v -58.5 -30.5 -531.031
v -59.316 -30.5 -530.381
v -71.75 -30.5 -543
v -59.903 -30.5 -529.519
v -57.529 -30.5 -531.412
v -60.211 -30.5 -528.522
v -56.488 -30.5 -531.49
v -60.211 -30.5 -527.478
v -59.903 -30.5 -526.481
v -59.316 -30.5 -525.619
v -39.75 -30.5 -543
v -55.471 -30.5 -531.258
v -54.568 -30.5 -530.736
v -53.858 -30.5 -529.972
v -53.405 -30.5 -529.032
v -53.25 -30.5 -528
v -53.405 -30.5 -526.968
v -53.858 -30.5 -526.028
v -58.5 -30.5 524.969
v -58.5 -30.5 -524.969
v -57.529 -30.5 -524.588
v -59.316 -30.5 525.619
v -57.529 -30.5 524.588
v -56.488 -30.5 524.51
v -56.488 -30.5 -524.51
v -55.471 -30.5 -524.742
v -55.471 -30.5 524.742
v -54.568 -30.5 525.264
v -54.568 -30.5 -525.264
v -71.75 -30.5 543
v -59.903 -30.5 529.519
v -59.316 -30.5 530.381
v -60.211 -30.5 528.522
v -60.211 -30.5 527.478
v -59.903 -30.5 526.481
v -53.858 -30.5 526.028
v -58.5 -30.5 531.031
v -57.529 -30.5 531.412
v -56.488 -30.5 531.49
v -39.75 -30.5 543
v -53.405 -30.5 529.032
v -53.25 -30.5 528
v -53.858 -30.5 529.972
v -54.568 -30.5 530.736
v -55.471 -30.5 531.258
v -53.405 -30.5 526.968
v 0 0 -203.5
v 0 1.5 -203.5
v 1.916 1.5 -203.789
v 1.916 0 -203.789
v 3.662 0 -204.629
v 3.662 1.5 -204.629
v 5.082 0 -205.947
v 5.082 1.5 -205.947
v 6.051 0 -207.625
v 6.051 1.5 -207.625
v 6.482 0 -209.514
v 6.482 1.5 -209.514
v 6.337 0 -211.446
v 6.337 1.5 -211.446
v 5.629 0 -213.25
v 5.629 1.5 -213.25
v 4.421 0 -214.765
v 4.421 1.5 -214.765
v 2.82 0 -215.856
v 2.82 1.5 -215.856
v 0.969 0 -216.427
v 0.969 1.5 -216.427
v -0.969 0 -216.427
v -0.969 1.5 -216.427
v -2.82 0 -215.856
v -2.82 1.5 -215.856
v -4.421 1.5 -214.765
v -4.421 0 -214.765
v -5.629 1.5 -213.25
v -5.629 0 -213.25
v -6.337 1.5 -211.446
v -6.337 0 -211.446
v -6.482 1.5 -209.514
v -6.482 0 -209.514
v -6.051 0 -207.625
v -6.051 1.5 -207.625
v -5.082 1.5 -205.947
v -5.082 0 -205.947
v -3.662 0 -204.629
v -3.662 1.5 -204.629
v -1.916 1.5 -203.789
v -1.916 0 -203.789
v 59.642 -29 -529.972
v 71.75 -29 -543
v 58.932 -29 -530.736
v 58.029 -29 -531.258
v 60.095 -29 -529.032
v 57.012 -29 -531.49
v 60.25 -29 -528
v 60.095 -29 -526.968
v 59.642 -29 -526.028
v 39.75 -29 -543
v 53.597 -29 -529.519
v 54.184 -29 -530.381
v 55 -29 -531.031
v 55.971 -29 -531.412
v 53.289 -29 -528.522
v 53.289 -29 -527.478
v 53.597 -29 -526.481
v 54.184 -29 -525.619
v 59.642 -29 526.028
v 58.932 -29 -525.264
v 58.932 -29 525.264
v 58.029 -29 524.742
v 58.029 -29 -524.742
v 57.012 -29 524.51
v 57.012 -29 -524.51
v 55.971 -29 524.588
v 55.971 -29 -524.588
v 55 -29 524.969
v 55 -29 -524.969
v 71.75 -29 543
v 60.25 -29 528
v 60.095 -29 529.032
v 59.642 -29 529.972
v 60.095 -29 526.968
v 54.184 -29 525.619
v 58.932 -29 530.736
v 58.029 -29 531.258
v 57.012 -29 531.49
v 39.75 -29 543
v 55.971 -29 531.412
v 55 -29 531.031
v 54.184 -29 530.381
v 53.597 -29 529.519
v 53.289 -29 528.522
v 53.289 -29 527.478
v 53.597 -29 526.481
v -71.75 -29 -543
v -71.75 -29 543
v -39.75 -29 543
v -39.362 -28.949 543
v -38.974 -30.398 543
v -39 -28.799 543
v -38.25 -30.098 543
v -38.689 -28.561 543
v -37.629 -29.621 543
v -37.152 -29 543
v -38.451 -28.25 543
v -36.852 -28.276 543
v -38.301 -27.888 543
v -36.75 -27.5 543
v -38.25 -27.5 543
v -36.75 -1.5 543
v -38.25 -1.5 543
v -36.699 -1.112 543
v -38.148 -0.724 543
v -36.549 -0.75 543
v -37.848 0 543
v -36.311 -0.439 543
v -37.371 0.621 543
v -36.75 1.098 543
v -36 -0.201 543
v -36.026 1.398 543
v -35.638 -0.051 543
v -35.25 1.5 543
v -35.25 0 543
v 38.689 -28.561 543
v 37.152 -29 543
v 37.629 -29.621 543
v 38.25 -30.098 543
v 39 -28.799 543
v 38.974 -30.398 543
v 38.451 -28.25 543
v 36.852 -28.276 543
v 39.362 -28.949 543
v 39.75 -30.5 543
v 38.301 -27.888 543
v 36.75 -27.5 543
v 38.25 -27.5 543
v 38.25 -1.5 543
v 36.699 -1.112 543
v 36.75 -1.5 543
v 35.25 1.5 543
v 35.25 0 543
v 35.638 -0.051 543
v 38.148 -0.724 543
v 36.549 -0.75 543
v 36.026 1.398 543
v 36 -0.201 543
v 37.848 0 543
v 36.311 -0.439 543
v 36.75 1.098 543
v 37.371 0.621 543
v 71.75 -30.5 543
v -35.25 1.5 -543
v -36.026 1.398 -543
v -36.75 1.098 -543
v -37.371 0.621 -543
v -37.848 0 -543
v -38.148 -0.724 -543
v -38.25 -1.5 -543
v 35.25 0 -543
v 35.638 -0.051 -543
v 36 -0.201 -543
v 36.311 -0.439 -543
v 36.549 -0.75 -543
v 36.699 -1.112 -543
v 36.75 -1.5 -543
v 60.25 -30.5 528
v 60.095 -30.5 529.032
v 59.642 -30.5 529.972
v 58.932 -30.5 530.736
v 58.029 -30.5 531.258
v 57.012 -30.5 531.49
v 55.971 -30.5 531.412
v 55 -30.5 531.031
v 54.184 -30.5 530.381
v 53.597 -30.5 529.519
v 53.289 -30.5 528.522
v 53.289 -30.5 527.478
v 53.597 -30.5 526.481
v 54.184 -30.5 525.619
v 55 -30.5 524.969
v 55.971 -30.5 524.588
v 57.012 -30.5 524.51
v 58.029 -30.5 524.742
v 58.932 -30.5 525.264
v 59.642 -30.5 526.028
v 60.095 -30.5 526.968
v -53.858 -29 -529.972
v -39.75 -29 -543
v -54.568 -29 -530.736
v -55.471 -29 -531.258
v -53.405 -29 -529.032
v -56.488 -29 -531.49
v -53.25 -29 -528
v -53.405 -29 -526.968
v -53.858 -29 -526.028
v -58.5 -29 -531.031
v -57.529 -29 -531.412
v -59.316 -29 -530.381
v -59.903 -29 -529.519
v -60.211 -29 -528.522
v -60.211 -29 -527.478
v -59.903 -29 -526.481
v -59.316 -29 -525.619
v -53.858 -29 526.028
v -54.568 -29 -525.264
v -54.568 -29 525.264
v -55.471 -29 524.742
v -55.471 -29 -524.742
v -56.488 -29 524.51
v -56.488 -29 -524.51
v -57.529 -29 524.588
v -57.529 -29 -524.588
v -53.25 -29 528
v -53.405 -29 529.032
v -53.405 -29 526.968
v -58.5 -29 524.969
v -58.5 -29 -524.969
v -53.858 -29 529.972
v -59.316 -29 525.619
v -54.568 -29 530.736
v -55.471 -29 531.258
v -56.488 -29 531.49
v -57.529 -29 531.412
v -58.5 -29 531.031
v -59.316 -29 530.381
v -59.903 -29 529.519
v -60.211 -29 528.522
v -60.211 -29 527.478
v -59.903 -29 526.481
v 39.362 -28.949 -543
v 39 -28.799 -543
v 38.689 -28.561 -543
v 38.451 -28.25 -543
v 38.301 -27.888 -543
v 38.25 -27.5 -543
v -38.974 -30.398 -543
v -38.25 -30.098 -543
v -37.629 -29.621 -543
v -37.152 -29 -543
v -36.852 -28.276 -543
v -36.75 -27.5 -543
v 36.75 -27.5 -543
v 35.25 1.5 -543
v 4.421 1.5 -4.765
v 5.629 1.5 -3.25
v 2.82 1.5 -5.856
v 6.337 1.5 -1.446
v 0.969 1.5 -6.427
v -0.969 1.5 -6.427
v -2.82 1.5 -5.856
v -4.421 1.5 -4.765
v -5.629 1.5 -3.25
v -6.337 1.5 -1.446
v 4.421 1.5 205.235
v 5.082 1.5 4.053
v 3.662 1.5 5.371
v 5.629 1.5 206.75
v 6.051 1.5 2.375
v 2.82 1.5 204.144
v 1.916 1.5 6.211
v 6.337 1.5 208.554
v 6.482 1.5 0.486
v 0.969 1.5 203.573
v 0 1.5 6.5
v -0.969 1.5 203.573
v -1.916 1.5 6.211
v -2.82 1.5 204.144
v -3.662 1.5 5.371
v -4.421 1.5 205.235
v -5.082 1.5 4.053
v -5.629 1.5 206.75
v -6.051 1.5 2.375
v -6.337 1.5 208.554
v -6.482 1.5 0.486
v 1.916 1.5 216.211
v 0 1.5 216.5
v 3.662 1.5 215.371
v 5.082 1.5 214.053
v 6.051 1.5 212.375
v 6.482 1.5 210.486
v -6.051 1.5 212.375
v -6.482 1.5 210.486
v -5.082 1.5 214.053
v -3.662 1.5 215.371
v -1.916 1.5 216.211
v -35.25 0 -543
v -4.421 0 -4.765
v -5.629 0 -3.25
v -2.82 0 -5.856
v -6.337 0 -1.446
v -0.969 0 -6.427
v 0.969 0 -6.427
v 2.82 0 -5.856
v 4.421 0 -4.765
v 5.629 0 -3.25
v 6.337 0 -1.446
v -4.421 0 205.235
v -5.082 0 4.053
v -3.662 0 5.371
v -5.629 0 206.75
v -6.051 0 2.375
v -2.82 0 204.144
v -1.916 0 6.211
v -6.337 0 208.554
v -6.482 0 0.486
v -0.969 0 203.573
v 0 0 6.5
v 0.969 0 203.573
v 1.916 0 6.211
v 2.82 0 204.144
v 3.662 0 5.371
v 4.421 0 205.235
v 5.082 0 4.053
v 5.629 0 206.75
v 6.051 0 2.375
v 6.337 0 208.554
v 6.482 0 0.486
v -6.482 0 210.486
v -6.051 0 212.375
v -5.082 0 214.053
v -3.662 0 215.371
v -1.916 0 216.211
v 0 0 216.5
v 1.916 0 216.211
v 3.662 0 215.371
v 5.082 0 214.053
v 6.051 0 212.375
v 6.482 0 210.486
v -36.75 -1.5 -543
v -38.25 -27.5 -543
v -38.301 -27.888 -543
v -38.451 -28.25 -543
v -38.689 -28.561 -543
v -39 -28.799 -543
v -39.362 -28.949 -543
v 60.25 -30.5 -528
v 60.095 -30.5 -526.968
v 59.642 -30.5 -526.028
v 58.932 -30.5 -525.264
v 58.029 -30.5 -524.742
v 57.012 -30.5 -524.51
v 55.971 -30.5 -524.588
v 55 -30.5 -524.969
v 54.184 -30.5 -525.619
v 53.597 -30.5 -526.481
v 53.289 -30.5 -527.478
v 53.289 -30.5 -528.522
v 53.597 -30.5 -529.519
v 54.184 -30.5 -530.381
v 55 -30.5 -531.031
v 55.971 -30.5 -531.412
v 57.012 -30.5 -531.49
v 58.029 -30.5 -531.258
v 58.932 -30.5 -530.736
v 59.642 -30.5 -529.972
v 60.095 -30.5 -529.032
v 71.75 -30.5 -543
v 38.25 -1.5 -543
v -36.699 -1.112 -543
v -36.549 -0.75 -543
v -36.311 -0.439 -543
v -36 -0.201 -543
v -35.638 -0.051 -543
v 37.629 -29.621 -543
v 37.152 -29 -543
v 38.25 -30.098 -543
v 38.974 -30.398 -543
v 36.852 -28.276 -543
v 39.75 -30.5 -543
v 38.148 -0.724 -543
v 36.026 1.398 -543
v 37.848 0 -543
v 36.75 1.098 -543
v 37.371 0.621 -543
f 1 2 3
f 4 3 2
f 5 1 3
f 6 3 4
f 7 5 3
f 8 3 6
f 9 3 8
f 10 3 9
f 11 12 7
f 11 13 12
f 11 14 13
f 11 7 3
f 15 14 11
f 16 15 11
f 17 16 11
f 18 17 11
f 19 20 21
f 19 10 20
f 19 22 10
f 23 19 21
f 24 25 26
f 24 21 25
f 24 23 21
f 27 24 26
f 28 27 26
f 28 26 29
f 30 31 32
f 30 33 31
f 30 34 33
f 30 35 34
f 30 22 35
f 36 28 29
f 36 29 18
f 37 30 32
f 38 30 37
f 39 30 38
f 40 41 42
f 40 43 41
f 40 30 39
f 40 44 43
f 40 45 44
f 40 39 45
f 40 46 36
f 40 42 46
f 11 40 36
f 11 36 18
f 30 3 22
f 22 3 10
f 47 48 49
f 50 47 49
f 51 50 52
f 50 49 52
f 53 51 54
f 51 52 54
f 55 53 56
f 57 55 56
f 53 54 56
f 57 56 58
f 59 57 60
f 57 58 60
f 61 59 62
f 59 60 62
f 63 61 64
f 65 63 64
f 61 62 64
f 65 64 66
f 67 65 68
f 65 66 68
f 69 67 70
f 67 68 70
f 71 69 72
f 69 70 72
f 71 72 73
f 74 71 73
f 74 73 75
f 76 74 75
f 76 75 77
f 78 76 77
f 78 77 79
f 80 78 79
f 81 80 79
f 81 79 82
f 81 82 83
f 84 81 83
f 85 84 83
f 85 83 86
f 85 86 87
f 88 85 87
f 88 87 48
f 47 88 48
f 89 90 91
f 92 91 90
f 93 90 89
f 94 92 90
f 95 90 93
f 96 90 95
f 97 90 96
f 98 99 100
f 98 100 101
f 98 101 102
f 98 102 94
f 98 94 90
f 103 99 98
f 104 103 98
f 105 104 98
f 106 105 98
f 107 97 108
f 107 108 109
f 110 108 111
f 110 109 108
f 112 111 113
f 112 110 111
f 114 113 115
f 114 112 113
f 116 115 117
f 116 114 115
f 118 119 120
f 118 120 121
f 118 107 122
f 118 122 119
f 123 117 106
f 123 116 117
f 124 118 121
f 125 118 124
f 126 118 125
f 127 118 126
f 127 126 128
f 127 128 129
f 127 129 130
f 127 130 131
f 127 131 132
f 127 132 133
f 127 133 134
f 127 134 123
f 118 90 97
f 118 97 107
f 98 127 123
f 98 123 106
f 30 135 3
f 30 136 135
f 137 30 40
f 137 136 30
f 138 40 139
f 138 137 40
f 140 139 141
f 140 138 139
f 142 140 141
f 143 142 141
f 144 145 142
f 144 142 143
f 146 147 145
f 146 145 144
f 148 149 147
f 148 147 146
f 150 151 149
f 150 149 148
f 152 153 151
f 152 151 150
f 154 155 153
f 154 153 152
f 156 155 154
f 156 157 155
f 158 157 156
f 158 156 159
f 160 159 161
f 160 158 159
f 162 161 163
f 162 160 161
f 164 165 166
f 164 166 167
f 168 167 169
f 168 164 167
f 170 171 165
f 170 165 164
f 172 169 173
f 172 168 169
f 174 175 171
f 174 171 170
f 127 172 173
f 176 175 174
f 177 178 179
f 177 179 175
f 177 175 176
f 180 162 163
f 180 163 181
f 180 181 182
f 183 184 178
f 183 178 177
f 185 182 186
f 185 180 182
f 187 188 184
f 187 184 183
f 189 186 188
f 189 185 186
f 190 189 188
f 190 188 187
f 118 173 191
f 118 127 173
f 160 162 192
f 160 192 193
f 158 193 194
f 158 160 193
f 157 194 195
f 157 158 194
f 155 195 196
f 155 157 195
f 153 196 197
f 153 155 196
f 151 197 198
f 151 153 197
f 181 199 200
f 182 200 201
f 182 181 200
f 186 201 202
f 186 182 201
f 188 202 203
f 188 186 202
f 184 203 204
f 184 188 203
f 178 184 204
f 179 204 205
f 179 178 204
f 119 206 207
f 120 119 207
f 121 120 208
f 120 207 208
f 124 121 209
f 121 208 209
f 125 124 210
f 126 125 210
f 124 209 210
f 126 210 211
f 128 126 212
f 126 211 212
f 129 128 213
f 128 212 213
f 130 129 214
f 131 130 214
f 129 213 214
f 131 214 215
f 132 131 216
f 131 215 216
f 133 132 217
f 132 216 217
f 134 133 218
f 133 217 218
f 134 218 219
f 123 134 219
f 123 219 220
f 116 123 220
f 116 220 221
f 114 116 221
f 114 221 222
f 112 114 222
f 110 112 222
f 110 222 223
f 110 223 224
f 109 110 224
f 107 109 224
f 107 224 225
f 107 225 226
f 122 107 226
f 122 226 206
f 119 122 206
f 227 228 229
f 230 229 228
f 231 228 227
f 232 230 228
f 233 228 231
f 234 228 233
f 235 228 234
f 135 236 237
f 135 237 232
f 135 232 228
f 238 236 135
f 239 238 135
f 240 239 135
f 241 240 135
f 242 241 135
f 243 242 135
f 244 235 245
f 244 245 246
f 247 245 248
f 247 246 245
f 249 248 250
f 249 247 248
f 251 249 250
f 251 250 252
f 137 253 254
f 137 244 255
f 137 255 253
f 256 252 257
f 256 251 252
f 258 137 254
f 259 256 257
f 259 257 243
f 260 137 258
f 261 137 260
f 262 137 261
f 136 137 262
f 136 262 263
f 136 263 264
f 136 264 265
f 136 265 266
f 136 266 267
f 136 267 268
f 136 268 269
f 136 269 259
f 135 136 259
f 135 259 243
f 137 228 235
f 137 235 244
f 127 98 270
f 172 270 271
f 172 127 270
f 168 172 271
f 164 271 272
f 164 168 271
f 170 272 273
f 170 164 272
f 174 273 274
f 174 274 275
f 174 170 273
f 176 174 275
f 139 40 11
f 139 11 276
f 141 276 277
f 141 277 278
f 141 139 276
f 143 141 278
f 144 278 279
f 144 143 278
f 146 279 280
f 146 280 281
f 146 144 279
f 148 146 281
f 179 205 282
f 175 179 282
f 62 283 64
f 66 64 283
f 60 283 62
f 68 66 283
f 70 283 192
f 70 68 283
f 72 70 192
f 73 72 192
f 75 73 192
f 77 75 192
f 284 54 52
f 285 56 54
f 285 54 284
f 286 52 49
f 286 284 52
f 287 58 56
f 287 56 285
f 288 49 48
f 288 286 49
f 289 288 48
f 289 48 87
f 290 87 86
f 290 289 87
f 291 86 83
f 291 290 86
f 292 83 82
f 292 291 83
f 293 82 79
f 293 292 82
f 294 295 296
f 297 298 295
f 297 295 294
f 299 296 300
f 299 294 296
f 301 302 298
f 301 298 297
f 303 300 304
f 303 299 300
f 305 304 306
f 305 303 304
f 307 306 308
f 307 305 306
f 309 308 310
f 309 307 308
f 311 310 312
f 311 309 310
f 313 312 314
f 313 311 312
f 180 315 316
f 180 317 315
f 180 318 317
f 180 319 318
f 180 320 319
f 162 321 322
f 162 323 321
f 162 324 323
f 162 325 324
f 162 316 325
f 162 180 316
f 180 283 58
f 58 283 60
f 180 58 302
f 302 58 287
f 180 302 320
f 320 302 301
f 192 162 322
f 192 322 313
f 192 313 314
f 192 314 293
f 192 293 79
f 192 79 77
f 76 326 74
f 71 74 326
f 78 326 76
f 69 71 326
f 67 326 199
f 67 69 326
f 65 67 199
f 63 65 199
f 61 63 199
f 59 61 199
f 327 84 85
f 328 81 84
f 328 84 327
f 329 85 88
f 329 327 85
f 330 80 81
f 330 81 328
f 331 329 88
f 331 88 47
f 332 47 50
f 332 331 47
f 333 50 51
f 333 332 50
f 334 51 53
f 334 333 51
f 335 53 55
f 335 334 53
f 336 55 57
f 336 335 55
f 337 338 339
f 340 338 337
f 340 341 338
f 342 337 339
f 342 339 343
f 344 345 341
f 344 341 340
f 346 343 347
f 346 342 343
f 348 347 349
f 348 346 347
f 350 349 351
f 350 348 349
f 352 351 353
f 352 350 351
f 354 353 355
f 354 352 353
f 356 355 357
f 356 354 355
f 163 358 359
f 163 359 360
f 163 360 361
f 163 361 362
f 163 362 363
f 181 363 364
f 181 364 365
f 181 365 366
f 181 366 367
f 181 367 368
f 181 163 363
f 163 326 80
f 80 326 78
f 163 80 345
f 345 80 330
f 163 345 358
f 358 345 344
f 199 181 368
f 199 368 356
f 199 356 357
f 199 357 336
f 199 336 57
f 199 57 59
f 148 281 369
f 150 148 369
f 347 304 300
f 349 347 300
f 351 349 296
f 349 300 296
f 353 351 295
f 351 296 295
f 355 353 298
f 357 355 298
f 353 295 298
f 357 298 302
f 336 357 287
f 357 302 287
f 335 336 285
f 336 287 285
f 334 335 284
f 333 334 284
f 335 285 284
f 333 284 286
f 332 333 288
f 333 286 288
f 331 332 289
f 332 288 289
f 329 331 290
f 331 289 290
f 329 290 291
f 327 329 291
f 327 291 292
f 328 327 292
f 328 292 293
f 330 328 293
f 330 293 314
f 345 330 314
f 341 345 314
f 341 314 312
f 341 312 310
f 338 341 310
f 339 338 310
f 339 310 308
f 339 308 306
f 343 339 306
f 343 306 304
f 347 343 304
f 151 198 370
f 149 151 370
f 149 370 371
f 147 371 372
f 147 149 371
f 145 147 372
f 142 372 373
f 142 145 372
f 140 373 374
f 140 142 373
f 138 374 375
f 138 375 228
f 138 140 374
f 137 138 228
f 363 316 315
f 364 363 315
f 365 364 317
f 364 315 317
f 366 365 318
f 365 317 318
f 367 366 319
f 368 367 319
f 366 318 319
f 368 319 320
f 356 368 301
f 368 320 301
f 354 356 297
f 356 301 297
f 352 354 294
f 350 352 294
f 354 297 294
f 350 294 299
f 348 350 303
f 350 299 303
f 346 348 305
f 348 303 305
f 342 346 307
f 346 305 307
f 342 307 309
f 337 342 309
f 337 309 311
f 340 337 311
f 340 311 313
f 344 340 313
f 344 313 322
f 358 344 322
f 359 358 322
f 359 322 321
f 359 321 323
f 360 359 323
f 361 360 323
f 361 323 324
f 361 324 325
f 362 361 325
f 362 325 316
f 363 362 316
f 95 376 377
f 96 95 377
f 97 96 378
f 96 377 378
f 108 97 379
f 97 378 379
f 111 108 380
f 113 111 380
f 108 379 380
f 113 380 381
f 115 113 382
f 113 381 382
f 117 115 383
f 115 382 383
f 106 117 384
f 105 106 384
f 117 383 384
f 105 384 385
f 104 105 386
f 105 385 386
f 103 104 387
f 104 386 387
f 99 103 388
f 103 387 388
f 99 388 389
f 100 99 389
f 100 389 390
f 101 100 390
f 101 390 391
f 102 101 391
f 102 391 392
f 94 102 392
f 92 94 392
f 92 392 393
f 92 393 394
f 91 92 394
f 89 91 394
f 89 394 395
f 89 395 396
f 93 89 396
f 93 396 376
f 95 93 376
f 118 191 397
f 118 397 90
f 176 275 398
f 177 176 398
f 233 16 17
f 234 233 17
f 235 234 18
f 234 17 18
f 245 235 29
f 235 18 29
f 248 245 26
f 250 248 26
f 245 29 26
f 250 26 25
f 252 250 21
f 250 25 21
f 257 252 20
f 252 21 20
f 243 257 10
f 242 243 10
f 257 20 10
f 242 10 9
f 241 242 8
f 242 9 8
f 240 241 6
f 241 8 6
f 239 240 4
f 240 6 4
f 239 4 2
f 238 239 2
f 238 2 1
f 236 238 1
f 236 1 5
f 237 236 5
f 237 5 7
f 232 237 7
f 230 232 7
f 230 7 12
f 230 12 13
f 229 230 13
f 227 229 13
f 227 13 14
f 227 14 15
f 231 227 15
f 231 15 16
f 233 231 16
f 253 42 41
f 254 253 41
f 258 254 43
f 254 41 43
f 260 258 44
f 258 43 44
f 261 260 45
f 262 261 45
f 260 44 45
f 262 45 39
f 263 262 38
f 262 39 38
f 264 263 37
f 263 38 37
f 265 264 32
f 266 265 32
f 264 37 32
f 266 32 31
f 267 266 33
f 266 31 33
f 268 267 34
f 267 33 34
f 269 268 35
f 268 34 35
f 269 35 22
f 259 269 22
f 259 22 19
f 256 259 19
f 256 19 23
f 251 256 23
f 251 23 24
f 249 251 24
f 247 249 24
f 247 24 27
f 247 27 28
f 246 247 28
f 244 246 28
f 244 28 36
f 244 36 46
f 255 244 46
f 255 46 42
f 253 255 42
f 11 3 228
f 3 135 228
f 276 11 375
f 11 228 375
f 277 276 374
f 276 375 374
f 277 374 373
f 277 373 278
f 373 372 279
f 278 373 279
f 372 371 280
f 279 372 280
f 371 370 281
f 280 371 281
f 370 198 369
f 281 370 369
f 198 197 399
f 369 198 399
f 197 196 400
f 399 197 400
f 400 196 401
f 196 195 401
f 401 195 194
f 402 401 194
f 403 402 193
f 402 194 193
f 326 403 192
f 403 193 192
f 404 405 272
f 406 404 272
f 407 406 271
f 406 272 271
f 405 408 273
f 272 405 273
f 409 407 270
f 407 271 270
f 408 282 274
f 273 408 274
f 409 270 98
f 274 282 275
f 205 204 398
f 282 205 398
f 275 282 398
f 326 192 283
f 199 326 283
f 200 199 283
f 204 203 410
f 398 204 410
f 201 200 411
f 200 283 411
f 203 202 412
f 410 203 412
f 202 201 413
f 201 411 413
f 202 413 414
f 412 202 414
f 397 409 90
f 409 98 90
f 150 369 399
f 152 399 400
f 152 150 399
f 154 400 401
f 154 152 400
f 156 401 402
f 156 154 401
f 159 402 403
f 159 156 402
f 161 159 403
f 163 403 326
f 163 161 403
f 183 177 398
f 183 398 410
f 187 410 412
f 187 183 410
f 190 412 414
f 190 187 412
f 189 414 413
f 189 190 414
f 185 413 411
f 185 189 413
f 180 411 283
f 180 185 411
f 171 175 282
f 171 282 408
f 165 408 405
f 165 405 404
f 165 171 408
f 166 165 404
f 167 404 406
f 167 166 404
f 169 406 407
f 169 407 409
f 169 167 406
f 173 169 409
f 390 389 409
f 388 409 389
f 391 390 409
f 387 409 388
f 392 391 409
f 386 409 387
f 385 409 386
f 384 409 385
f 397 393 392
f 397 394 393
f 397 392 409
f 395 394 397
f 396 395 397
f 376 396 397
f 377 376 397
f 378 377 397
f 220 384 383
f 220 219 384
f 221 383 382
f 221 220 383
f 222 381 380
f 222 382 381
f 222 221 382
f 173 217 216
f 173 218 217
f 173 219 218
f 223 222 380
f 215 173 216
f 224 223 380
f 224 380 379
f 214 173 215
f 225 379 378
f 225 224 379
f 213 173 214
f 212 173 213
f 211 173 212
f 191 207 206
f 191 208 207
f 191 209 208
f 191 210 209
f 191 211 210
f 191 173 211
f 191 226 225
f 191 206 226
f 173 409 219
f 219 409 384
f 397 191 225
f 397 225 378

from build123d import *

# Parameters (mm, degrees)
SM_BASE_FLANGE_1_DEPTH = 543
SKETCH_7_R             = 3.5
CUT_EXTRUDE_2_DEPTH    = 10
SKETCH_8_R             = 6.5
CUT_EXTRUDE_3_DEPTH    = 10


# Sheet-metal steps are written as plain solids
with BuildPart() as part:
    # Sketch 1 → Базовая кромка1 (new, symmetric)
    with BuildSketch(Plane.XY):
        with BuildLine():
            Line((-71.75, -30.5), (-39.75, -30.5))
            ThreePointArc((-39.75, -30.5), (-37.628679656, -29.621320344), (-36.75, -27.5))
            Line((-36.75, -27.5), (-36.75, -1.5))
            ThreePointArc((-36.75, -1.5), (-36.310660172, -0.439339828), (-35.25, 0))
            Line((-35.25, 0), (35.25, 0))
            ThreePointArc((35.25, 0), (36.310660172, -0.439339828), (36.75, -1.5))
            Line((36.75, -1.5), (36.75, -27.5))
            ThreePointArc((36.75, -27.5), (37.628679656, -29.621320344), (39.75, -30.5))
            Line((39.75, -30.5), (71.75, -30.5))
            Line((71.75, -30.5), (71.75, -29))
            Line((71.75, -29), (39.75, -29))
            ThreePointArc((39.75, -29), (38.689339828, -28.560660172), (38.25, -27.5))
            Line((38.25, -27.5), (38.25, -1.5))
            ThreePointArc((38.25, -1.5), (37.371320344, 0.621320344), (35.25, 1.5))
            Line((35.25, 1.5), (-35.25, 1.5))
            ThreePointArc((-35.25, 1.5), (-37.371320344, 0.621320344), (-38.25, -1.5))
            Line((-38.25, -1.5), (-38.25, -27.5))
            ThreePointArc((-38.25, -27.5), (-38.689339828, -28.560660172), (-39.75, -29))
            Line((-39.75, -29), (-71.75, -29))
            Line((-71.75, -29), (-71.75, -30.5))
        make_face()
    extrude(amount=SM_BASE_FLANGE_1_DEPTH, both=True)

    # Эскиз7 → Вырез-Вытянуть2 (cut)
    with BuildSketch(Plane.XZ.offset(30.5)):
        with Locations((56.75, 528)):
            Circle(SKETCH_7_R)
        with Locations((-56.75, 528)):
            Circle(SKETCH_7_R)
        with Locations((56.75, -528)):
            Circle(SKETCH_7_R)
        with Locations((-56.75, -528)):
            Circle(SKETCH_7_R)
    extrude(amount=-CUT_EXTRUDE_2_DEPTH, mode=Mode.SUBTRACT)

    # Эскиз8 → Вырез-Вытянуть3 (cut)
    with BuildSketch(Plane(origin=(0, 1.5, 0), x_dir=(1, 0, 0), z_dir=(0, 1, 0))):
        with Locations(Location((0, 210, 0), (0, 0, 270))):
            Circle(SKETCH_8_R)
        with Locations(Location((0, 0, 0), (0, 0, 270))):
            Circle(SKETCH_8_R)
        with Locations(Location((0, -210, 0), (0, 0, 270))):
            Circle(SKETCH_8_R)
    extrude(amount=-CUT_EXTRUDE_3_DEPTH, mode=Mode.SUBTRACT)


solid = part.part
